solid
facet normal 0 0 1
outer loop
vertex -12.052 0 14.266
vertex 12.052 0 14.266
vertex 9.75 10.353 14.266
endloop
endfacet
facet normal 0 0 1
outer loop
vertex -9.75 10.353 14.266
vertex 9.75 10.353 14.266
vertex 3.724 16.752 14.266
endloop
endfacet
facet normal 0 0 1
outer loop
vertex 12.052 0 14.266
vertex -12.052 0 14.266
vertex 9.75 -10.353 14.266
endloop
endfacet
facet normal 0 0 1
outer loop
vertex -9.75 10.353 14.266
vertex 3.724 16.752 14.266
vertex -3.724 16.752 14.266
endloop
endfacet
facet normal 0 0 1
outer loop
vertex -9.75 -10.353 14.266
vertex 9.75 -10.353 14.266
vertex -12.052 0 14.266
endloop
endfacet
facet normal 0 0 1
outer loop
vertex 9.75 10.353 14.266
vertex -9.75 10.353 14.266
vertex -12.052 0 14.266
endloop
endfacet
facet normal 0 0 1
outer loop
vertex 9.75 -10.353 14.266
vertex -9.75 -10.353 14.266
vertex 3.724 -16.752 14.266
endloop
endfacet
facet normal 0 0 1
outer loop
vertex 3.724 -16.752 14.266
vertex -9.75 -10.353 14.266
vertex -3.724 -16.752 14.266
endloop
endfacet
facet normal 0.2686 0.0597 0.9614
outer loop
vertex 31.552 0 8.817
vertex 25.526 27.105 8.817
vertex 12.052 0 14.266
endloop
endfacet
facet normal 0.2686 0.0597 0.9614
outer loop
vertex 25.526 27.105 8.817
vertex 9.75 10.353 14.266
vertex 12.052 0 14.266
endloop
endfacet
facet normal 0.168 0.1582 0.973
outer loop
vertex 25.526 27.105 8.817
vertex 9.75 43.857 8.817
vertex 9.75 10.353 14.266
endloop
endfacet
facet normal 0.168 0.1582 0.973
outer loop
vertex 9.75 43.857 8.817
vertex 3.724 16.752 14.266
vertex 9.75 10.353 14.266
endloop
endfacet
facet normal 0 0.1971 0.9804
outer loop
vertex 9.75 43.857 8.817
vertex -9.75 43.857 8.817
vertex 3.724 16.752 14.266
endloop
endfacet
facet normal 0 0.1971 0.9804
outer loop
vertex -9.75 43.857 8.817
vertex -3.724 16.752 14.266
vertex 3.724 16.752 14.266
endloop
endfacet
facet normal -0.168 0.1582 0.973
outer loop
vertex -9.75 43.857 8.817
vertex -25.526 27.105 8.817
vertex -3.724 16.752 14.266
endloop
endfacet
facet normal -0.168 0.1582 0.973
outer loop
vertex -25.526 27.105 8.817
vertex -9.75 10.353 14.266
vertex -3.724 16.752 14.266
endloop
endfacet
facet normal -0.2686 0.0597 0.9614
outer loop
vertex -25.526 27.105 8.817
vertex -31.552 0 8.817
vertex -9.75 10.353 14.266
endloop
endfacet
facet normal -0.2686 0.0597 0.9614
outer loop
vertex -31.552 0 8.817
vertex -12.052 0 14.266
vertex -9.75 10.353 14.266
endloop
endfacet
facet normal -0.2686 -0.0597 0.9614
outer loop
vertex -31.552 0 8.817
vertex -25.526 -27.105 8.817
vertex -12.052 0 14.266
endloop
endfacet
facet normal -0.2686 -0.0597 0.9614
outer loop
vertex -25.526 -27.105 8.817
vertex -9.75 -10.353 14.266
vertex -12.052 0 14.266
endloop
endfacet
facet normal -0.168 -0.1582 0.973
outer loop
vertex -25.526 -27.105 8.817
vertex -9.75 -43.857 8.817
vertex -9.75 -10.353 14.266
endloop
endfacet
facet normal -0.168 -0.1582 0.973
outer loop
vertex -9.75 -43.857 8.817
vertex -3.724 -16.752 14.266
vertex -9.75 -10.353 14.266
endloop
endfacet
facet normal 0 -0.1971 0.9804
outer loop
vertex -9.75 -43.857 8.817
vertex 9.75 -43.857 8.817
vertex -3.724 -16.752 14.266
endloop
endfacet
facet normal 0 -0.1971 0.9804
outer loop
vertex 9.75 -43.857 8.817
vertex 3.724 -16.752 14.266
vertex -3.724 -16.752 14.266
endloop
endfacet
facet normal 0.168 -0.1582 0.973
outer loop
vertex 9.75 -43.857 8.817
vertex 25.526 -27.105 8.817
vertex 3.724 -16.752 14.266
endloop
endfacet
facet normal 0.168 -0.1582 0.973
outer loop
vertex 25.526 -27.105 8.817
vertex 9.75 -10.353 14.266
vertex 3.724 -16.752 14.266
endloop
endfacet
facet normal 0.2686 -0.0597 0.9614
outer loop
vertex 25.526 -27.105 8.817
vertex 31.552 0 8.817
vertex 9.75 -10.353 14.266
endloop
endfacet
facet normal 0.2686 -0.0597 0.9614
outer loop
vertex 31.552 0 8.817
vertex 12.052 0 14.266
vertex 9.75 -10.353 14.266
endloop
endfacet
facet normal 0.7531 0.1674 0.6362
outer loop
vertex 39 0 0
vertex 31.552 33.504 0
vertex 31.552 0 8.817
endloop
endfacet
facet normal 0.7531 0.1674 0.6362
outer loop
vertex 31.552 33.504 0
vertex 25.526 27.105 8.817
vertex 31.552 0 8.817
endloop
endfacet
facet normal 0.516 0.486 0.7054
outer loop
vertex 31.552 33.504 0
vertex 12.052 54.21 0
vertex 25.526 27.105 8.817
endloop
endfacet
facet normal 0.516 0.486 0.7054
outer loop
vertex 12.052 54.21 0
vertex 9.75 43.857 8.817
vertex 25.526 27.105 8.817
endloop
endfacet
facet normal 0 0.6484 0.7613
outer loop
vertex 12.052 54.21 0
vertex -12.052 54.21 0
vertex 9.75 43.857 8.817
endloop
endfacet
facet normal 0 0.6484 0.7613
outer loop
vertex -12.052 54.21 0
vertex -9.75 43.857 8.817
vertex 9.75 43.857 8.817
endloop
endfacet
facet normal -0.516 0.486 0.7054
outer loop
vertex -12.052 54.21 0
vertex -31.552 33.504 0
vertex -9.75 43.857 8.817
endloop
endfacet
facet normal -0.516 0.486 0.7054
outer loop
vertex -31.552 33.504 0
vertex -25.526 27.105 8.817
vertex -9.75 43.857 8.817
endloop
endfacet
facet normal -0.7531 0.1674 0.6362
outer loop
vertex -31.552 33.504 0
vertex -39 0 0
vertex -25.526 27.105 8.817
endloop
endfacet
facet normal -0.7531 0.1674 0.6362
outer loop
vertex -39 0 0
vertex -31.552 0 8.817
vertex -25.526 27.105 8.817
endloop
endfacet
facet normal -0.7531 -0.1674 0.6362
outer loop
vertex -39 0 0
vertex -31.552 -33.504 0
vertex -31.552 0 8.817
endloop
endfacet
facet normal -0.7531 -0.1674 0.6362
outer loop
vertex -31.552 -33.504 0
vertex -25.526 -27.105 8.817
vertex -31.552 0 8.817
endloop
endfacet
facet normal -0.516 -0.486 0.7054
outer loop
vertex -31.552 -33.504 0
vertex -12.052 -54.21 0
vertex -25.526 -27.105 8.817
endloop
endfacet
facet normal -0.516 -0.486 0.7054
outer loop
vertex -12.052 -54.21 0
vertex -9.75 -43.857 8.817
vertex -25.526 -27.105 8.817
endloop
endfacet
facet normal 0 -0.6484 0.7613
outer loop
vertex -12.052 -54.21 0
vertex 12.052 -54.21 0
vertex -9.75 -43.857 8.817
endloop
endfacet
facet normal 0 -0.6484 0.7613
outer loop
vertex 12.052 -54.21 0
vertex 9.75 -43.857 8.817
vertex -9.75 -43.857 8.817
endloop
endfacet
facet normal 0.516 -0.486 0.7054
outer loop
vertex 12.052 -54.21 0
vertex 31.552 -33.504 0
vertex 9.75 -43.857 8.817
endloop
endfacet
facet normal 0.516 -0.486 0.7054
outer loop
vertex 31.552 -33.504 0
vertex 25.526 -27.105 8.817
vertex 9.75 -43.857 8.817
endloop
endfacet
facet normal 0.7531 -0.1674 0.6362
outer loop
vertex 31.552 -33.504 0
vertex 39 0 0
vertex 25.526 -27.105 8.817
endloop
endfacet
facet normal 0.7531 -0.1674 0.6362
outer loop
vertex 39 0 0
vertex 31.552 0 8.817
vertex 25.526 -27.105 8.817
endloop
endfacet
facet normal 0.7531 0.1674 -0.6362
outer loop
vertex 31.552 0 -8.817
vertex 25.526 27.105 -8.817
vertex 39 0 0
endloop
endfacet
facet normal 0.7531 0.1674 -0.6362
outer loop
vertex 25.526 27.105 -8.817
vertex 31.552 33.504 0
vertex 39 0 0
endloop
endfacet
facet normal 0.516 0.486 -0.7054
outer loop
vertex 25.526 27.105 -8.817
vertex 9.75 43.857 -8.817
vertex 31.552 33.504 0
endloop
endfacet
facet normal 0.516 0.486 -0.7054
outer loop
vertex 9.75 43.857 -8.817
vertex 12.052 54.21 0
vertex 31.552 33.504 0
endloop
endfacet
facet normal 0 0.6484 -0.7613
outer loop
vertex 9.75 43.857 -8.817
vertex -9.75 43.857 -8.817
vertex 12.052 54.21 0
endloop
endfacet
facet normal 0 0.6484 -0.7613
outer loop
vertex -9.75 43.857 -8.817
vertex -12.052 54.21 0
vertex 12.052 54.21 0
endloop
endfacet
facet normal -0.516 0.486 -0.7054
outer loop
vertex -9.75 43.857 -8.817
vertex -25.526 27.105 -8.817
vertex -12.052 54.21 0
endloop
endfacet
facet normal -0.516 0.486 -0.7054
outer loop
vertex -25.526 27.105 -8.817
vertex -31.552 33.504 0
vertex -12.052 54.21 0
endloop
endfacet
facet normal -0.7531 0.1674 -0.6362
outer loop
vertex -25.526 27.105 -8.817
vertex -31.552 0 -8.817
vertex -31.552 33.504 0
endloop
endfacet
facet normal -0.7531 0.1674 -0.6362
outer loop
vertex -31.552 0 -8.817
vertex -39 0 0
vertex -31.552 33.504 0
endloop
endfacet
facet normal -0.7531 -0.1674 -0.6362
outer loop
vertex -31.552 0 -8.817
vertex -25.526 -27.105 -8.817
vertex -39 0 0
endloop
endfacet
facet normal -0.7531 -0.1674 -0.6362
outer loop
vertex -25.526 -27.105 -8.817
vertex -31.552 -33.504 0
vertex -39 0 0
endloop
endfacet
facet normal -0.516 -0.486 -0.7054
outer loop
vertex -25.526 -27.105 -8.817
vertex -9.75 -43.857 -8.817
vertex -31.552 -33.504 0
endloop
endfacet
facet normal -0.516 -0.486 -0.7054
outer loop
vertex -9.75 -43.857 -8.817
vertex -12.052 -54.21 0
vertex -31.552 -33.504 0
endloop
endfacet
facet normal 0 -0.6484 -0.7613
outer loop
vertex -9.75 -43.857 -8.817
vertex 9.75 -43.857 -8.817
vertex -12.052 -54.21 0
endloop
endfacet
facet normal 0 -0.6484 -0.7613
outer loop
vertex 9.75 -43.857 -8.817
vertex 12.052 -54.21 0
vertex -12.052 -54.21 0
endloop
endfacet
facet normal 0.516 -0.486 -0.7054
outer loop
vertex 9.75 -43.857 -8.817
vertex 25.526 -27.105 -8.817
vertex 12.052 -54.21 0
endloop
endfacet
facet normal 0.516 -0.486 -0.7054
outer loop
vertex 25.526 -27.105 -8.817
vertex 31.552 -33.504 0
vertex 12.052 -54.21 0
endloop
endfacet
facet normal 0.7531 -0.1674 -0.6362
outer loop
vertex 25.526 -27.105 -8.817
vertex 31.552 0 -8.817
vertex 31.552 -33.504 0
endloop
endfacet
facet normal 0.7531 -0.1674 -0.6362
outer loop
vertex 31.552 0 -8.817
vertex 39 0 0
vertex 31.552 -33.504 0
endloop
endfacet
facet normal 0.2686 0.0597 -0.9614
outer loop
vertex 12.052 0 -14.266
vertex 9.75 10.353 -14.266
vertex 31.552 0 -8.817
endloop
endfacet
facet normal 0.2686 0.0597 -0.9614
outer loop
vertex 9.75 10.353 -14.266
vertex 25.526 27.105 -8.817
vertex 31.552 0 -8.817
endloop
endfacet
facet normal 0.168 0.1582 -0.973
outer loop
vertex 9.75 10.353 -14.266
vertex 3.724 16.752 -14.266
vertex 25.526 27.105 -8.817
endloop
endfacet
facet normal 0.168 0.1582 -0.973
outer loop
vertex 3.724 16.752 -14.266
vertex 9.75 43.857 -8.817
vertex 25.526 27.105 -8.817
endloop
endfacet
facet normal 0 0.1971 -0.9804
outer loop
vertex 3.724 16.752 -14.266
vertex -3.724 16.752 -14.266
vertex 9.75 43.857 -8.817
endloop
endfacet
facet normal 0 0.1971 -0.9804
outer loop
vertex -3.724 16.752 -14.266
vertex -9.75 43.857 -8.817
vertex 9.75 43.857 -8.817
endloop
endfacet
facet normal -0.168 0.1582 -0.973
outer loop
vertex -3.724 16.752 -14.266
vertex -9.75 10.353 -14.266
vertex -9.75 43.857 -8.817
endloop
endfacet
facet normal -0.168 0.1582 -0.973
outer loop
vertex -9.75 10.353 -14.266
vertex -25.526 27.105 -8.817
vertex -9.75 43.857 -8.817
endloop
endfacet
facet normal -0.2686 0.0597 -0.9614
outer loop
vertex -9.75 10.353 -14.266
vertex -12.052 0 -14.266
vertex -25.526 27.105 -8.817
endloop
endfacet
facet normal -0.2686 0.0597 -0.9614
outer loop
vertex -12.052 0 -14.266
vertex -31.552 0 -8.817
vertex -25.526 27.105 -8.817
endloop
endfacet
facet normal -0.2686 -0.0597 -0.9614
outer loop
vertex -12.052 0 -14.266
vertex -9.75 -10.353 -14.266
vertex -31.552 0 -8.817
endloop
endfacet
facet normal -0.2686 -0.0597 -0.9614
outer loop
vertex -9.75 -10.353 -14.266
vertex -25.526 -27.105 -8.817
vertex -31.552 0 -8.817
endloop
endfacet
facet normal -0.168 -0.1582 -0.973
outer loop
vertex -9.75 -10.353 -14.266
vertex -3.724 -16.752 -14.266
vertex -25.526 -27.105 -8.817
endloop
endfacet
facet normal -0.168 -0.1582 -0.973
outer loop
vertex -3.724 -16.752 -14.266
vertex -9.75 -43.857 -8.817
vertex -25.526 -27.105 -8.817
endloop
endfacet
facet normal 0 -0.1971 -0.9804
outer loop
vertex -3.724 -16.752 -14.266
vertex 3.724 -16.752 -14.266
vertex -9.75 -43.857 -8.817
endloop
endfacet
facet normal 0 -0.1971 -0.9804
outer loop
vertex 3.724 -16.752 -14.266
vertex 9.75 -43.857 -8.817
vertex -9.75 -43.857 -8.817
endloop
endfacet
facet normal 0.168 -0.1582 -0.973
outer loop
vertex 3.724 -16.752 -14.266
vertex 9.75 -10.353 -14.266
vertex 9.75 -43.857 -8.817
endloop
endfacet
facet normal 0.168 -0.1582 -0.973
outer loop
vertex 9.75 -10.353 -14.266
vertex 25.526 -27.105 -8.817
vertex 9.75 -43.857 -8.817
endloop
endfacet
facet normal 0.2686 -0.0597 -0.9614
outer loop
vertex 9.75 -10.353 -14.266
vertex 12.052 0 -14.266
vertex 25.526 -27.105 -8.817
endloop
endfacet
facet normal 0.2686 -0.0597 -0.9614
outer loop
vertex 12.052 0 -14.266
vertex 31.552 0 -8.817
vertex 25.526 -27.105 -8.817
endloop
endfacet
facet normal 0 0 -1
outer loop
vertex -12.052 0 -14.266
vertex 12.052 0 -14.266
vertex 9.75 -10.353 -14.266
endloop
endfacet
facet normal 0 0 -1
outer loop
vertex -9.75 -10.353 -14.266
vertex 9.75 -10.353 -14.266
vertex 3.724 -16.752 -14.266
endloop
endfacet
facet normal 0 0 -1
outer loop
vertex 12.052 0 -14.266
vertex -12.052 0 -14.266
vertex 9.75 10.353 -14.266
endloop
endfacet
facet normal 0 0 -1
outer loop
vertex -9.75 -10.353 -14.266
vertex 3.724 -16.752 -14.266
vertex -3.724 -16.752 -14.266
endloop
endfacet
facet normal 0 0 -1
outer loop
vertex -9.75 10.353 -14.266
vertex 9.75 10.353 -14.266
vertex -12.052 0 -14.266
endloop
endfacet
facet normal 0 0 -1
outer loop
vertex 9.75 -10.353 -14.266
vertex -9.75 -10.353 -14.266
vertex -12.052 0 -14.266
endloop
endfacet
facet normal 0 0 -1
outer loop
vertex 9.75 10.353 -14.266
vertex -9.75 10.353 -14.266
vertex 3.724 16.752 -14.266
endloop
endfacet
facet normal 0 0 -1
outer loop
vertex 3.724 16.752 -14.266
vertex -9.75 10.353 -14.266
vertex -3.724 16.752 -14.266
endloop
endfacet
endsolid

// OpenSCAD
// Generated by SolidPython 1.0.1 on 2020-07-29 00:46:51


scale(v = [13, 19, 5]) {
	sphere(r = 3);
}
/***********************************************
*********      SolidPython code:      **********
************************************************
 
# import packages: SolidPython
from solid import *
from solid.utils import *
from itertools import chain, combinations, permutations


class Resize:

    def __init__(self, scad_file):
        self.scad_file = scad_file
        #self.scad_file = import_scad(scad_file)
        # cone/cylinder param:
        self.r1 = 0
        self.r2 = 0
        self.h = 0
        # rectangular prism param:
        self.w = 0
        self.l = 0
        # ellipse param:
        self.r = 0

    # import OpenScad code (file name corresponds to shape)


    # classify shape + parameters
    def assign(self, param1, param2, param3):
        if self.scad_file == 'cone.scad':
            self.r1 = param1
            self.r2 = param2
            self.h = param3
        elif self.scad_file == 'cylinder.scad':
            self.r1 = param1
            self.r2 = param2
            self.h = param3
        elif self.scad_file == 'rectangularPrism.scad':
            self.h = param1
            self.l = param2
            self.w = param3
        else:
            self.r = param1
            self.h = param2

    # resize parameters
    def iterate(self):
        x = range(3, 20, 2)
        i = 1
        if self.scad_file == 'cone.scad':
            tempList = list(permutations(x, 2))
            for temp in tempList:
                param1 = temp[0]
                param2 = temp[1]
                filepath = 'produced_scad_files/' + 'cone' + str(param1) + '_' + str(param2) + '_' + '.scad'
                scad_render_to_file(cylinder(h=param1, r1=param2, r2=0), filepath)

        elif self.scad_file == 'cylinder.scad':
            tempList = list(permutations(x, 3))
            for temp in tempList:
                param1 = temp[0]
                param2 = temp[1]
                filepath = 'produced_scad_files/' + 'cylinder' + str(param1) + '_' + str(param2) + '_' + '.scad'
                scad_render_to_file(cylinder(h=param1, r1=param2, r2=param2), filepath)

        elif self.scad_file == 'rectangularPrism.scad':
            tempList = list(permutations(x, 3))
            for temp in tempList:
                param1 = temp[0]
                param2 = temp[1]
                param3 = temp[2]
                filepath = 'produced_scad_files/' + 'rectangularPrism' + str(param1) + '_' + str(param2) + '_' + str(
                    param3) + '.scad'
                scad_render_to_file(cube(size=(param1, param2, param3)), filepath)

        elif self.scad_file == 'ellipse.scad':
            tempList = list(permutations(x, 4))
            for temp in tempList:
                param1 = temp[0]
                param2 = temp[1]
                param3 = temp[2]
                param4 = temp[3]
                filepath = 'produced_scad_files/' + 'ellipse' + str(param1) + '_' + str(param2) + '_' + str(param3) + '_' + str(param4) + '.scad'
                scad_render_to_file(scale([param1, param2, param3])(sphere(r=param4)), filepath)

    def render_to_scadfile(self):
        scad_render_to_file(scad, 'example.scad') 
 
************************************************/
